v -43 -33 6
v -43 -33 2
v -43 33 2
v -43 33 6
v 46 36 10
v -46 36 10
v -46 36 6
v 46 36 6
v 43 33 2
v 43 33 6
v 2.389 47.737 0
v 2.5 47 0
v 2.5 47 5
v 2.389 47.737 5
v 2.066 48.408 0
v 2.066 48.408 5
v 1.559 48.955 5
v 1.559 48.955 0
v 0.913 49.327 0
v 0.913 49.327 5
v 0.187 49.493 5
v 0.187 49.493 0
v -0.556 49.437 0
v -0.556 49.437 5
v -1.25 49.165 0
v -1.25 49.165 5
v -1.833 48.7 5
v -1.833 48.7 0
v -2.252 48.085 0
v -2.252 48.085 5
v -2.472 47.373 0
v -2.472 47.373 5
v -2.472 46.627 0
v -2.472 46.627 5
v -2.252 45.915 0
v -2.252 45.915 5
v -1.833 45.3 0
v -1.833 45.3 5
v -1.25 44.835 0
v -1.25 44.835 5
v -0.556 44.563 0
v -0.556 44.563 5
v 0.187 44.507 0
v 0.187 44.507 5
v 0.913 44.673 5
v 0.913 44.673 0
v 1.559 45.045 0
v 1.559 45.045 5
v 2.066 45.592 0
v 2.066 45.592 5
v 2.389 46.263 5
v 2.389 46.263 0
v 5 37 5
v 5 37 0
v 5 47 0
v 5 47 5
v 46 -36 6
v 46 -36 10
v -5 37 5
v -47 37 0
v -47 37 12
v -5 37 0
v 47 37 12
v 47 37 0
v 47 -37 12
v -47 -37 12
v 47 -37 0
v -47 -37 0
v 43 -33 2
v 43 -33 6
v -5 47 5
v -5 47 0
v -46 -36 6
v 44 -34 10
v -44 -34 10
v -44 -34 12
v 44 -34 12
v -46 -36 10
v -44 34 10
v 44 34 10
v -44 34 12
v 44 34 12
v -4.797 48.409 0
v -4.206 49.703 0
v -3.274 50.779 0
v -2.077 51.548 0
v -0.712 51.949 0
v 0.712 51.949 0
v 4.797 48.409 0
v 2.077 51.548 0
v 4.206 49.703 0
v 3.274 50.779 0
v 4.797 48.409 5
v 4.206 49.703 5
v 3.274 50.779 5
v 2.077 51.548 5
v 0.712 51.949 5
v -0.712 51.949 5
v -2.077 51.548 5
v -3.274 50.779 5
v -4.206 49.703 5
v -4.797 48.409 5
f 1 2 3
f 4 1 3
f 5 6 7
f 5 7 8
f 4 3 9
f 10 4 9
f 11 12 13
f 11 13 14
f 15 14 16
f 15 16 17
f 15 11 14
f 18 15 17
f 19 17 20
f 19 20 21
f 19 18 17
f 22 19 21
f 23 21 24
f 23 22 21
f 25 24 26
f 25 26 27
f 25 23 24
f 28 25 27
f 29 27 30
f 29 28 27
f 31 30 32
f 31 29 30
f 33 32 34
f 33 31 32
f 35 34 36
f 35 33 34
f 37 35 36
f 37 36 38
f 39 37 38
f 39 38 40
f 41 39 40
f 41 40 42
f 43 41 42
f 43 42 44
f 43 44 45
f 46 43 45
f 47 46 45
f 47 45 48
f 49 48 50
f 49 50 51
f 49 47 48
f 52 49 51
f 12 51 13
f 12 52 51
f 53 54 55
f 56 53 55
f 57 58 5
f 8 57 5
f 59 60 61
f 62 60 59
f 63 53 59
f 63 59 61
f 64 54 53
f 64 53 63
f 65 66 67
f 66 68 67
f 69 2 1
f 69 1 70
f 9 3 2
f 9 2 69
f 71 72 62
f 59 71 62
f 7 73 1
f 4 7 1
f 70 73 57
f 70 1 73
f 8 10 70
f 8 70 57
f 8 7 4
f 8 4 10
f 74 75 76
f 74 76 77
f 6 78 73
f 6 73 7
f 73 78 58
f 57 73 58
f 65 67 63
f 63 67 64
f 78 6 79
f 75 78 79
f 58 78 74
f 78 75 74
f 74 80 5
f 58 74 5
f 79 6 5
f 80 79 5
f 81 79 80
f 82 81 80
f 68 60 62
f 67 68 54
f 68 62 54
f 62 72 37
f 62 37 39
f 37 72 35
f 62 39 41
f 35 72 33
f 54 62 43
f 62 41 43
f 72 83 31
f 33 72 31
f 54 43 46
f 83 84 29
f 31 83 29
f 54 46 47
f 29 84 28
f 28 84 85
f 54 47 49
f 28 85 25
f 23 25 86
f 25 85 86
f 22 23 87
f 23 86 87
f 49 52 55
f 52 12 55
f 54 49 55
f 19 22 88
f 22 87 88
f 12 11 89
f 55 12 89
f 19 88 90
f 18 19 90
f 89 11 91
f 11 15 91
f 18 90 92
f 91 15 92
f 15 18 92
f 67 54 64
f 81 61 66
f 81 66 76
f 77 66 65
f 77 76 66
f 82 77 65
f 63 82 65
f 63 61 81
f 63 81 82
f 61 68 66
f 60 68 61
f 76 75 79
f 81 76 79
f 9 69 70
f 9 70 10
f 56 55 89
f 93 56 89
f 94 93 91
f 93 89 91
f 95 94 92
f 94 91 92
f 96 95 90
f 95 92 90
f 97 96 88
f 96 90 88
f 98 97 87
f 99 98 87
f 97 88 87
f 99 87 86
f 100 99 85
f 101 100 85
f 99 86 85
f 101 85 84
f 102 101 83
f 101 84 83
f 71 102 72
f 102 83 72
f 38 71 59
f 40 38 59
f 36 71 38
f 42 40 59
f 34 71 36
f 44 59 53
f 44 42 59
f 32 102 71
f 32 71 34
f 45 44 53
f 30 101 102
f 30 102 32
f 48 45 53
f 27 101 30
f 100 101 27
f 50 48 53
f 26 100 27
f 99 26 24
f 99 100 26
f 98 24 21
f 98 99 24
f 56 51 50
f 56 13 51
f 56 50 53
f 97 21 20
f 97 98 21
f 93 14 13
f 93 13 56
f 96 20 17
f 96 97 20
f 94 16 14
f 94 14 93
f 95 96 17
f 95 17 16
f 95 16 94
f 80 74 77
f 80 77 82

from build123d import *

# Parameters (mm, degrees)
F0_W     = 86
F0_H     = 66
F1_DEPTH = 2
F2_DEPTH = 10
F3_W     = 92
F3_H     = 72
F3_W_2   = 86
F3_H_2   = 66
F4_DEPTH = 4
F5_W     = 94
F5_H     = 74
F5_W_2   = 88
F5_H_2   = 2
F5_W_3   = 2
F5_H_3   = 68
F6_DEPTH = 2
F0_R     = 2.5
F7_DEPTH = 5


with BuildPart() as f1:
    # F0 (on Top) → F1 (new body)
    with BuildSketch(Plane.XY):
        Rectangle(F0_W, F0_H)
    extrude(amount=F1_DEPTH)

    # F0 (on Top) → F2 (join)
    with BuildSketch(Plane.XY):
        Polygon((47, -37), (47, 37), (5, 37), (-5, 37), (-47, 37), (-47, -37), align=None)
        Rectangle(F0_W, F0_H, mode=Mode.SUBTRACT)
    extrude(amount=F2_DEPTH)

    # F3 (on face) → F4 (cut)
    with BuildSketch(Plane.XY.offset(10)):
        Rectangle(F3_W, F3_H)
        Rectangle(F3_W_2, F3_H_2, mode=Mode.SUBTRACT)
    extrude(amount=-F4_DEPTH, mode=Mode.SUBTRACT)

    # F5 (on face) → F6 (join)
    with BuildSketch(Plane.XY.offset(10)):
        Rectangle(F5_W, F5_H)
        Polygon((-44, -36), (-46, -36), (-46, -34), (-46, 34), (-46, 36), (-44, 36), (44, 36), (46, 36), (46, 34), (46, -34), (46, -36), (44, -36), align=None, mode=Mode.SUBTRACT)
        with Locations((0, 35)):
            Rectangle(F5_W_2, F5_H_2)
        with Locations((0, -35)):
            Rectangle(F5_W_2, F5_H_2)
        with Locations((-45, 0)):
            Rectangle(F5_W_3, F5_H_3)
        with Locations((45, 0)):
            Rectangle(F5_W_3, F5_H_3)
        with Locations((-45, 35)):
            Rectangle(F5_W_3, F5_H_2)
        with Locations((45, 35)):
            Rectangle(F5_W_3, F5_H_2)
        with Locations((45, -35)):
            Rectangle(F5_W_3, F5_H_2)
        with Locations((-45, -35)):
            Rectangle(F5_W_3, F5_H_2)
    extrude(amount=F6_DEPTH)

    # F0 (on Top) → F7 (join)
    with BuildSketch(Plane.XY):
        with BuildLine():
            Line((-5, 37), (5, 37))
            Line((5, 37), (5, 47))
            ThreePointArc((5, 47), (0, 42), (-5, 47))
            Line((-5, 47), (-5, 37))
        make_face()
        with BuildLine():
            ThreePointArc((-5, 47), (0, 42), (5, 47))
            ThreePointArc((5, 47), (0, 52), (-5, 47))
        make_face()
        with Locations((0, 47)):
            Circle(F0_R, mode=Mode.SUBTRACT)
    extrude(amount=F7_DEPTH)


solid = f1.part
